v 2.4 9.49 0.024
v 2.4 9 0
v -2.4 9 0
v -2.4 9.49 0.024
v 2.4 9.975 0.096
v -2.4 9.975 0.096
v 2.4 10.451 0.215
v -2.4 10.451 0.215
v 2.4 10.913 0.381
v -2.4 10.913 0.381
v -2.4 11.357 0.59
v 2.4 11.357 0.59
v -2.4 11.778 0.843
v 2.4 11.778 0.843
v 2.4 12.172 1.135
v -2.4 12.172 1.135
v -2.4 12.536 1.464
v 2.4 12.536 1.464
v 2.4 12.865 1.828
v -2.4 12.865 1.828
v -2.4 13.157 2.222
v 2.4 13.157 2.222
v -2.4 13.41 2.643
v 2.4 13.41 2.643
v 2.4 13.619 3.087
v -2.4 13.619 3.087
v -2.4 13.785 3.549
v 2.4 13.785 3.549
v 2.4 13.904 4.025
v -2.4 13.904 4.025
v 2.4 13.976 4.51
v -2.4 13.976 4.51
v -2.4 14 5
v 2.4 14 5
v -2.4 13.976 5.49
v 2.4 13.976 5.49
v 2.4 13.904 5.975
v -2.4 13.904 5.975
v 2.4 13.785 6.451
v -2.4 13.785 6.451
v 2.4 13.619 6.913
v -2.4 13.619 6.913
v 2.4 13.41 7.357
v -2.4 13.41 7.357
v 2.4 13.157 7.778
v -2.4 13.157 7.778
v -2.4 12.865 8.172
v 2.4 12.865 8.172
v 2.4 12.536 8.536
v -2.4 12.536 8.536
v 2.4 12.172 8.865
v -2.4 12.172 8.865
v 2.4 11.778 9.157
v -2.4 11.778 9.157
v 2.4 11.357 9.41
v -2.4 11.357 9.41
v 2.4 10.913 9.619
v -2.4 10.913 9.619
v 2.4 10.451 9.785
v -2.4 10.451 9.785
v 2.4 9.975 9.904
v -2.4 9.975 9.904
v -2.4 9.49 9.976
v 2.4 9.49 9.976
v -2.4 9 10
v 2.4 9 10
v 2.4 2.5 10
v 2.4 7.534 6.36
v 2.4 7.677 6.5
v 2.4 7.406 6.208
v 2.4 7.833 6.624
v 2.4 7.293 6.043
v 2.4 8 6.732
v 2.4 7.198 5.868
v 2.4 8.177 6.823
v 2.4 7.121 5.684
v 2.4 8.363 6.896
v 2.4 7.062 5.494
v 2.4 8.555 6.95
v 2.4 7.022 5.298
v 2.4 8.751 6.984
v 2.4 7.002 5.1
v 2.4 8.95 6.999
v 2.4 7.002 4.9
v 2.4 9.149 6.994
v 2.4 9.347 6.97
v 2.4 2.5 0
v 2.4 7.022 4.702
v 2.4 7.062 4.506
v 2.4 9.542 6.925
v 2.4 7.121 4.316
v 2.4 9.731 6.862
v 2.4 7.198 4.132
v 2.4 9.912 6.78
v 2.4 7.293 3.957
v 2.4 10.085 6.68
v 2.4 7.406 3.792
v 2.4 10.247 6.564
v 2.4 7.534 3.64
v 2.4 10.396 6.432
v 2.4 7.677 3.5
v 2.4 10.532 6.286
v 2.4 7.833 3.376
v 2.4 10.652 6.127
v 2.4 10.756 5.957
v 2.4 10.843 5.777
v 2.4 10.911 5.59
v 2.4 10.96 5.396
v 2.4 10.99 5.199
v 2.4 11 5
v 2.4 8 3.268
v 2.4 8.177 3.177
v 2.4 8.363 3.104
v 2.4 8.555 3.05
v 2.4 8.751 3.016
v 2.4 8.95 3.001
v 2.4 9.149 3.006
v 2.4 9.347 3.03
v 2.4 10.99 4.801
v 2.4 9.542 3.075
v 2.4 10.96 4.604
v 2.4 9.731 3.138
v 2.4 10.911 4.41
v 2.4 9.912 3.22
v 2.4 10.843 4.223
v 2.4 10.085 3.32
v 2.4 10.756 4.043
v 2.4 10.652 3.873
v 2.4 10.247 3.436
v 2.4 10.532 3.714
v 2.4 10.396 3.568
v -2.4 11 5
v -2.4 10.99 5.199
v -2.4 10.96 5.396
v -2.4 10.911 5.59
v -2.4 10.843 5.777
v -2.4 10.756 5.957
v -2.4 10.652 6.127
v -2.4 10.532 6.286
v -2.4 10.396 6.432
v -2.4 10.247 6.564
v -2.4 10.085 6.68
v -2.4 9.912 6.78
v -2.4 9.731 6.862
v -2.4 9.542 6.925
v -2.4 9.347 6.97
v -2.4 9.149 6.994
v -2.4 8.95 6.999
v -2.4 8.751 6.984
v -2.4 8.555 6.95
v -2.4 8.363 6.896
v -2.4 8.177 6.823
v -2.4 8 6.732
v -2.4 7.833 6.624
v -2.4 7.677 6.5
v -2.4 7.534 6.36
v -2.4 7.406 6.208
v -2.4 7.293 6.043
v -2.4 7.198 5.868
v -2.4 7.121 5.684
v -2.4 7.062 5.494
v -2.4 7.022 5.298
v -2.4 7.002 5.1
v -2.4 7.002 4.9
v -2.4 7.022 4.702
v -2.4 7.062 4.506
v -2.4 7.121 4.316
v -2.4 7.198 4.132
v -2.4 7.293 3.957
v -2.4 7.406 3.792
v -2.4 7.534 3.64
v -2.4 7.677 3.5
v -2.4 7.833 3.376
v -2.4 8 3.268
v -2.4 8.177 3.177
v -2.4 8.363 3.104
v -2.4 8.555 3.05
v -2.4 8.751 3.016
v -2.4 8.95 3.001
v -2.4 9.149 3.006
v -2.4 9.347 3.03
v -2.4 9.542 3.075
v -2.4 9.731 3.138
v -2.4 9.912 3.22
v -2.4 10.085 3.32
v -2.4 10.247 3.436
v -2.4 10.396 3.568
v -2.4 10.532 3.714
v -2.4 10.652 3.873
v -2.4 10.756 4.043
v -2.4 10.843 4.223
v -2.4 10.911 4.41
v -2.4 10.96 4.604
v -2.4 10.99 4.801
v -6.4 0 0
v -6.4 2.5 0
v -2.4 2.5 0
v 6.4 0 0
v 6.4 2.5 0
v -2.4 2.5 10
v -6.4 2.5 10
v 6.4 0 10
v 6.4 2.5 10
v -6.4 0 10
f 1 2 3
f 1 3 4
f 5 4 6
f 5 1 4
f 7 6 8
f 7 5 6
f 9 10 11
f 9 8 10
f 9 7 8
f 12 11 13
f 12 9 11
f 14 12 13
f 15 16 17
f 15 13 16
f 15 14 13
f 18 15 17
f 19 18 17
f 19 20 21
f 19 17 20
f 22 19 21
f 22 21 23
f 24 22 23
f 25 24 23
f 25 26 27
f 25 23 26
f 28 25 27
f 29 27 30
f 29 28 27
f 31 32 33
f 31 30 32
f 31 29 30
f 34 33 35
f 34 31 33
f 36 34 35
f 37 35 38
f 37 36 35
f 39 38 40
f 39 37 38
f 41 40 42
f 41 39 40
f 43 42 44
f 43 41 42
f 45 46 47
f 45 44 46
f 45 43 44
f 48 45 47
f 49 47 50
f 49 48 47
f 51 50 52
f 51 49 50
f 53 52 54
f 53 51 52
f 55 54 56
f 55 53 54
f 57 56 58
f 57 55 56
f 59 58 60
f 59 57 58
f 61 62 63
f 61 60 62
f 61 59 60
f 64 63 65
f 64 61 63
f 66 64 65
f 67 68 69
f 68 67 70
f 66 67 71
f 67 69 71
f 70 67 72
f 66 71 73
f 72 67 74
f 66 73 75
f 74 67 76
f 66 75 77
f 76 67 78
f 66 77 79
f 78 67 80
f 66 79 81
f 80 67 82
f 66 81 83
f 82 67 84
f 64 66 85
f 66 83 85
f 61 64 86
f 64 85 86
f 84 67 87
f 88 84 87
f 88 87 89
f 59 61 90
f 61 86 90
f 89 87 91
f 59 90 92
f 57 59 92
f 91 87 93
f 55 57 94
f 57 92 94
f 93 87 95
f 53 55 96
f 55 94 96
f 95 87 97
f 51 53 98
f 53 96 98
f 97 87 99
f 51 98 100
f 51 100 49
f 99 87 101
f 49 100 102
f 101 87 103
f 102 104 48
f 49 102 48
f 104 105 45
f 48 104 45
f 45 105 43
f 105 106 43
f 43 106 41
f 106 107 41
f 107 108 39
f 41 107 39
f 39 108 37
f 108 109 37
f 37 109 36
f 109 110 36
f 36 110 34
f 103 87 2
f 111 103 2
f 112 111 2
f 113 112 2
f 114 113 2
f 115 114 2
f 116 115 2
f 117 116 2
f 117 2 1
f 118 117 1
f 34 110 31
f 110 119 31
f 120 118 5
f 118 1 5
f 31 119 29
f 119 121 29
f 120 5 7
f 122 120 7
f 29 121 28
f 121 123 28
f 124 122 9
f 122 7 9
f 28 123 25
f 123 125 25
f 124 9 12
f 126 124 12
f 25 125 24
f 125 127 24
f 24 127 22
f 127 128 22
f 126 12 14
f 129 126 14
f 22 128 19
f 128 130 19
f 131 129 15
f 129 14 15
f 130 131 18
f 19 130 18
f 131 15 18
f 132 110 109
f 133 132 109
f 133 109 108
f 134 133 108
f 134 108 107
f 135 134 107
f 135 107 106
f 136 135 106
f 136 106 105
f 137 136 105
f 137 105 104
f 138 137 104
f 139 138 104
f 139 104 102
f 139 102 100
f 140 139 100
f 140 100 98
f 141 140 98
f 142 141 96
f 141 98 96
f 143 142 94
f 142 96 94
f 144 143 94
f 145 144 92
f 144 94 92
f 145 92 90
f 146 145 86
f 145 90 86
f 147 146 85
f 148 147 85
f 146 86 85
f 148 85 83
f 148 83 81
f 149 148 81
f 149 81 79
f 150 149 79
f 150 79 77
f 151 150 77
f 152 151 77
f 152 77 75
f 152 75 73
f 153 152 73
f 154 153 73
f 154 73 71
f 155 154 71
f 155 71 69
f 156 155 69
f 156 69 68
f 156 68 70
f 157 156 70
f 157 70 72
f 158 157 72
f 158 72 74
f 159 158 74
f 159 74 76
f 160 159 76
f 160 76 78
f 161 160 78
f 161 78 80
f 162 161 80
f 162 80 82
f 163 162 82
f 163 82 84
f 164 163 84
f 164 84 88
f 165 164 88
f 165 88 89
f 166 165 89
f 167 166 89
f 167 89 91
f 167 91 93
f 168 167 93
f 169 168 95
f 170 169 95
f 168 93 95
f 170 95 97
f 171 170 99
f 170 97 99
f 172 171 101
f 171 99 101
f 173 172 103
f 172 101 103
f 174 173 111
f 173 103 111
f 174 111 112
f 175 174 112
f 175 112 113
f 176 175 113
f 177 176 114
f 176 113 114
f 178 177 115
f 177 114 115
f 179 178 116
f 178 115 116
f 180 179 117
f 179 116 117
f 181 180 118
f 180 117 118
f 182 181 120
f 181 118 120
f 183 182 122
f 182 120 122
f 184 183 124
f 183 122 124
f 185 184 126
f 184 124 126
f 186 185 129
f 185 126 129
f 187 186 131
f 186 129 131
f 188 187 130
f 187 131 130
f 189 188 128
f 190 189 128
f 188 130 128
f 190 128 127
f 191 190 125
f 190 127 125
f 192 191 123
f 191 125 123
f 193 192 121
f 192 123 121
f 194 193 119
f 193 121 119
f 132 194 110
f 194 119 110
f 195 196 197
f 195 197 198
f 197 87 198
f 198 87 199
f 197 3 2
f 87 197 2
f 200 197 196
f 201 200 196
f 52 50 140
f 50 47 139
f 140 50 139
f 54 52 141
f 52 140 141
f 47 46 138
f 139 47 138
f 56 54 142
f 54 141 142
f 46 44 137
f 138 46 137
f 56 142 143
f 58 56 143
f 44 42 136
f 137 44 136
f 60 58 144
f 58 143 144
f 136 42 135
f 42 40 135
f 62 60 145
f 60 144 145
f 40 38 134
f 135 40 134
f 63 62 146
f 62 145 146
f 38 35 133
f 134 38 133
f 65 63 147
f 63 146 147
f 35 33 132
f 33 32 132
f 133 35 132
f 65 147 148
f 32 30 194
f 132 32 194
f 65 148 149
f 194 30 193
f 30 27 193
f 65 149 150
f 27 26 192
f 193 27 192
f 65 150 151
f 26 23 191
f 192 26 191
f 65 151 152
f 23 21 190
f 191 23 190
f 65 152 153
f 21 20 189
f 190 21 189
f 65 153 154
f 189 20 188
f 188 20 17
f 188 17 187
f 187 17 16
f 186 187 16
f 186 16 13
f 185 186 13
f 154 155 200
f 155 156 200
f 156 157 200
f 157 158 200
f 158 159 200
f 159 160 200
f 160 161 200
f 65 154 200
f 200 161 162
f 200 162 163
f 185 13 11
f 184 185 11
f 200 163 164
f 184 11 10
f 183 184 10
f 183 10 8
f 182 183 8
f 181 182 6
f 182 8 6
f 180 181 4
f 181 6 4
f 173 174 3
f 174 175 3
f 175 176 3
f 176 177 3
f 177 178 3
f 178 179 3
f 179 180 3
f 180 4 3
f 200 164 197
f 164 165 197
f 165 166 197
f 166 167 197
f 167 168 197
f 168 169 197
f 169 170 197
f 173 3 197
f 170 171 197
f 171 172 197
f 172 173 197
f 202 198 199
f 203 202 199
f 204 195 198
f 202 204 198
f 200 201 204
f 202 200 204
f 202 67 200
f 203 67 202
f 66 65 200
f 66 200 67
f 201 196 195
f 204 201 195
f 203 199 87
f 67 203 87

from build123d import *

# Parameters (mm, degrees)
EXTRUDE_1_DEPTH     = 10
SKETCH_2_OUTSIDE_W  = 16.288
SKETCH_2_OUTSIDE_H  = 20.288
SKETCH_2_OUTSIDE_R  = 2
CUT_EXTRUDE_3_DEPTH = 20.324595727


with BuildPart() as part:
    # Эскиз1 → Бобышка-Вытянуть1 (new body)
    with BuildSketch(Plane.XY):
        Polygon((-6.4, 0), (6.4, 0), (6.4, 2.5), (2.4, 2.5), (2.4, 14), (-2.4, 14), (-2.4, 2.5), (-6.4, 2.5), align=None)
    extrude(amount=EXTRUDE_1_DEPTH)

    # Эскиз2 outside → Вырез-Вытянуть3 (cut, through all)
    # profile 1 of 2: a face of its own
    with BuildSketch(Plane(origin=(2.4, 0, 0), x_dir=(0, 0, -1), z_dir=(1, 0, 0))):
        with Locations((-5, 7)):
            Rectangle(SKETCH_2_OUTSIDE_W, SKETCH_2_OUTSIDE_H)
        with BuildLine():
            Line((-10, 9), (-10, 0))
            Line((-10, 0), (0, 0))
            Line((0, 0), (0, 9))
            ThreePointArc((0, 9), (-5, 14), (-10, 9))
        make_face(mode=Mode.SUBTRACT)
    # profile 2 of 2: a face of its own
    with BuildSketch(Plane(origin=(2.4, 0, 0), x_dir=(0, 0, -1), z_dir=(1, 0, 0))):
        with Locations(Location((-5, 9, 0), (0, 0, 90))):
            Circle(SKETCH_2_OUTSIDE_R)
    extrude(amount=-CUT_EXTRUDE_3_DEPTH, mode=Mode.SUBTRACT)


solid = part.part
